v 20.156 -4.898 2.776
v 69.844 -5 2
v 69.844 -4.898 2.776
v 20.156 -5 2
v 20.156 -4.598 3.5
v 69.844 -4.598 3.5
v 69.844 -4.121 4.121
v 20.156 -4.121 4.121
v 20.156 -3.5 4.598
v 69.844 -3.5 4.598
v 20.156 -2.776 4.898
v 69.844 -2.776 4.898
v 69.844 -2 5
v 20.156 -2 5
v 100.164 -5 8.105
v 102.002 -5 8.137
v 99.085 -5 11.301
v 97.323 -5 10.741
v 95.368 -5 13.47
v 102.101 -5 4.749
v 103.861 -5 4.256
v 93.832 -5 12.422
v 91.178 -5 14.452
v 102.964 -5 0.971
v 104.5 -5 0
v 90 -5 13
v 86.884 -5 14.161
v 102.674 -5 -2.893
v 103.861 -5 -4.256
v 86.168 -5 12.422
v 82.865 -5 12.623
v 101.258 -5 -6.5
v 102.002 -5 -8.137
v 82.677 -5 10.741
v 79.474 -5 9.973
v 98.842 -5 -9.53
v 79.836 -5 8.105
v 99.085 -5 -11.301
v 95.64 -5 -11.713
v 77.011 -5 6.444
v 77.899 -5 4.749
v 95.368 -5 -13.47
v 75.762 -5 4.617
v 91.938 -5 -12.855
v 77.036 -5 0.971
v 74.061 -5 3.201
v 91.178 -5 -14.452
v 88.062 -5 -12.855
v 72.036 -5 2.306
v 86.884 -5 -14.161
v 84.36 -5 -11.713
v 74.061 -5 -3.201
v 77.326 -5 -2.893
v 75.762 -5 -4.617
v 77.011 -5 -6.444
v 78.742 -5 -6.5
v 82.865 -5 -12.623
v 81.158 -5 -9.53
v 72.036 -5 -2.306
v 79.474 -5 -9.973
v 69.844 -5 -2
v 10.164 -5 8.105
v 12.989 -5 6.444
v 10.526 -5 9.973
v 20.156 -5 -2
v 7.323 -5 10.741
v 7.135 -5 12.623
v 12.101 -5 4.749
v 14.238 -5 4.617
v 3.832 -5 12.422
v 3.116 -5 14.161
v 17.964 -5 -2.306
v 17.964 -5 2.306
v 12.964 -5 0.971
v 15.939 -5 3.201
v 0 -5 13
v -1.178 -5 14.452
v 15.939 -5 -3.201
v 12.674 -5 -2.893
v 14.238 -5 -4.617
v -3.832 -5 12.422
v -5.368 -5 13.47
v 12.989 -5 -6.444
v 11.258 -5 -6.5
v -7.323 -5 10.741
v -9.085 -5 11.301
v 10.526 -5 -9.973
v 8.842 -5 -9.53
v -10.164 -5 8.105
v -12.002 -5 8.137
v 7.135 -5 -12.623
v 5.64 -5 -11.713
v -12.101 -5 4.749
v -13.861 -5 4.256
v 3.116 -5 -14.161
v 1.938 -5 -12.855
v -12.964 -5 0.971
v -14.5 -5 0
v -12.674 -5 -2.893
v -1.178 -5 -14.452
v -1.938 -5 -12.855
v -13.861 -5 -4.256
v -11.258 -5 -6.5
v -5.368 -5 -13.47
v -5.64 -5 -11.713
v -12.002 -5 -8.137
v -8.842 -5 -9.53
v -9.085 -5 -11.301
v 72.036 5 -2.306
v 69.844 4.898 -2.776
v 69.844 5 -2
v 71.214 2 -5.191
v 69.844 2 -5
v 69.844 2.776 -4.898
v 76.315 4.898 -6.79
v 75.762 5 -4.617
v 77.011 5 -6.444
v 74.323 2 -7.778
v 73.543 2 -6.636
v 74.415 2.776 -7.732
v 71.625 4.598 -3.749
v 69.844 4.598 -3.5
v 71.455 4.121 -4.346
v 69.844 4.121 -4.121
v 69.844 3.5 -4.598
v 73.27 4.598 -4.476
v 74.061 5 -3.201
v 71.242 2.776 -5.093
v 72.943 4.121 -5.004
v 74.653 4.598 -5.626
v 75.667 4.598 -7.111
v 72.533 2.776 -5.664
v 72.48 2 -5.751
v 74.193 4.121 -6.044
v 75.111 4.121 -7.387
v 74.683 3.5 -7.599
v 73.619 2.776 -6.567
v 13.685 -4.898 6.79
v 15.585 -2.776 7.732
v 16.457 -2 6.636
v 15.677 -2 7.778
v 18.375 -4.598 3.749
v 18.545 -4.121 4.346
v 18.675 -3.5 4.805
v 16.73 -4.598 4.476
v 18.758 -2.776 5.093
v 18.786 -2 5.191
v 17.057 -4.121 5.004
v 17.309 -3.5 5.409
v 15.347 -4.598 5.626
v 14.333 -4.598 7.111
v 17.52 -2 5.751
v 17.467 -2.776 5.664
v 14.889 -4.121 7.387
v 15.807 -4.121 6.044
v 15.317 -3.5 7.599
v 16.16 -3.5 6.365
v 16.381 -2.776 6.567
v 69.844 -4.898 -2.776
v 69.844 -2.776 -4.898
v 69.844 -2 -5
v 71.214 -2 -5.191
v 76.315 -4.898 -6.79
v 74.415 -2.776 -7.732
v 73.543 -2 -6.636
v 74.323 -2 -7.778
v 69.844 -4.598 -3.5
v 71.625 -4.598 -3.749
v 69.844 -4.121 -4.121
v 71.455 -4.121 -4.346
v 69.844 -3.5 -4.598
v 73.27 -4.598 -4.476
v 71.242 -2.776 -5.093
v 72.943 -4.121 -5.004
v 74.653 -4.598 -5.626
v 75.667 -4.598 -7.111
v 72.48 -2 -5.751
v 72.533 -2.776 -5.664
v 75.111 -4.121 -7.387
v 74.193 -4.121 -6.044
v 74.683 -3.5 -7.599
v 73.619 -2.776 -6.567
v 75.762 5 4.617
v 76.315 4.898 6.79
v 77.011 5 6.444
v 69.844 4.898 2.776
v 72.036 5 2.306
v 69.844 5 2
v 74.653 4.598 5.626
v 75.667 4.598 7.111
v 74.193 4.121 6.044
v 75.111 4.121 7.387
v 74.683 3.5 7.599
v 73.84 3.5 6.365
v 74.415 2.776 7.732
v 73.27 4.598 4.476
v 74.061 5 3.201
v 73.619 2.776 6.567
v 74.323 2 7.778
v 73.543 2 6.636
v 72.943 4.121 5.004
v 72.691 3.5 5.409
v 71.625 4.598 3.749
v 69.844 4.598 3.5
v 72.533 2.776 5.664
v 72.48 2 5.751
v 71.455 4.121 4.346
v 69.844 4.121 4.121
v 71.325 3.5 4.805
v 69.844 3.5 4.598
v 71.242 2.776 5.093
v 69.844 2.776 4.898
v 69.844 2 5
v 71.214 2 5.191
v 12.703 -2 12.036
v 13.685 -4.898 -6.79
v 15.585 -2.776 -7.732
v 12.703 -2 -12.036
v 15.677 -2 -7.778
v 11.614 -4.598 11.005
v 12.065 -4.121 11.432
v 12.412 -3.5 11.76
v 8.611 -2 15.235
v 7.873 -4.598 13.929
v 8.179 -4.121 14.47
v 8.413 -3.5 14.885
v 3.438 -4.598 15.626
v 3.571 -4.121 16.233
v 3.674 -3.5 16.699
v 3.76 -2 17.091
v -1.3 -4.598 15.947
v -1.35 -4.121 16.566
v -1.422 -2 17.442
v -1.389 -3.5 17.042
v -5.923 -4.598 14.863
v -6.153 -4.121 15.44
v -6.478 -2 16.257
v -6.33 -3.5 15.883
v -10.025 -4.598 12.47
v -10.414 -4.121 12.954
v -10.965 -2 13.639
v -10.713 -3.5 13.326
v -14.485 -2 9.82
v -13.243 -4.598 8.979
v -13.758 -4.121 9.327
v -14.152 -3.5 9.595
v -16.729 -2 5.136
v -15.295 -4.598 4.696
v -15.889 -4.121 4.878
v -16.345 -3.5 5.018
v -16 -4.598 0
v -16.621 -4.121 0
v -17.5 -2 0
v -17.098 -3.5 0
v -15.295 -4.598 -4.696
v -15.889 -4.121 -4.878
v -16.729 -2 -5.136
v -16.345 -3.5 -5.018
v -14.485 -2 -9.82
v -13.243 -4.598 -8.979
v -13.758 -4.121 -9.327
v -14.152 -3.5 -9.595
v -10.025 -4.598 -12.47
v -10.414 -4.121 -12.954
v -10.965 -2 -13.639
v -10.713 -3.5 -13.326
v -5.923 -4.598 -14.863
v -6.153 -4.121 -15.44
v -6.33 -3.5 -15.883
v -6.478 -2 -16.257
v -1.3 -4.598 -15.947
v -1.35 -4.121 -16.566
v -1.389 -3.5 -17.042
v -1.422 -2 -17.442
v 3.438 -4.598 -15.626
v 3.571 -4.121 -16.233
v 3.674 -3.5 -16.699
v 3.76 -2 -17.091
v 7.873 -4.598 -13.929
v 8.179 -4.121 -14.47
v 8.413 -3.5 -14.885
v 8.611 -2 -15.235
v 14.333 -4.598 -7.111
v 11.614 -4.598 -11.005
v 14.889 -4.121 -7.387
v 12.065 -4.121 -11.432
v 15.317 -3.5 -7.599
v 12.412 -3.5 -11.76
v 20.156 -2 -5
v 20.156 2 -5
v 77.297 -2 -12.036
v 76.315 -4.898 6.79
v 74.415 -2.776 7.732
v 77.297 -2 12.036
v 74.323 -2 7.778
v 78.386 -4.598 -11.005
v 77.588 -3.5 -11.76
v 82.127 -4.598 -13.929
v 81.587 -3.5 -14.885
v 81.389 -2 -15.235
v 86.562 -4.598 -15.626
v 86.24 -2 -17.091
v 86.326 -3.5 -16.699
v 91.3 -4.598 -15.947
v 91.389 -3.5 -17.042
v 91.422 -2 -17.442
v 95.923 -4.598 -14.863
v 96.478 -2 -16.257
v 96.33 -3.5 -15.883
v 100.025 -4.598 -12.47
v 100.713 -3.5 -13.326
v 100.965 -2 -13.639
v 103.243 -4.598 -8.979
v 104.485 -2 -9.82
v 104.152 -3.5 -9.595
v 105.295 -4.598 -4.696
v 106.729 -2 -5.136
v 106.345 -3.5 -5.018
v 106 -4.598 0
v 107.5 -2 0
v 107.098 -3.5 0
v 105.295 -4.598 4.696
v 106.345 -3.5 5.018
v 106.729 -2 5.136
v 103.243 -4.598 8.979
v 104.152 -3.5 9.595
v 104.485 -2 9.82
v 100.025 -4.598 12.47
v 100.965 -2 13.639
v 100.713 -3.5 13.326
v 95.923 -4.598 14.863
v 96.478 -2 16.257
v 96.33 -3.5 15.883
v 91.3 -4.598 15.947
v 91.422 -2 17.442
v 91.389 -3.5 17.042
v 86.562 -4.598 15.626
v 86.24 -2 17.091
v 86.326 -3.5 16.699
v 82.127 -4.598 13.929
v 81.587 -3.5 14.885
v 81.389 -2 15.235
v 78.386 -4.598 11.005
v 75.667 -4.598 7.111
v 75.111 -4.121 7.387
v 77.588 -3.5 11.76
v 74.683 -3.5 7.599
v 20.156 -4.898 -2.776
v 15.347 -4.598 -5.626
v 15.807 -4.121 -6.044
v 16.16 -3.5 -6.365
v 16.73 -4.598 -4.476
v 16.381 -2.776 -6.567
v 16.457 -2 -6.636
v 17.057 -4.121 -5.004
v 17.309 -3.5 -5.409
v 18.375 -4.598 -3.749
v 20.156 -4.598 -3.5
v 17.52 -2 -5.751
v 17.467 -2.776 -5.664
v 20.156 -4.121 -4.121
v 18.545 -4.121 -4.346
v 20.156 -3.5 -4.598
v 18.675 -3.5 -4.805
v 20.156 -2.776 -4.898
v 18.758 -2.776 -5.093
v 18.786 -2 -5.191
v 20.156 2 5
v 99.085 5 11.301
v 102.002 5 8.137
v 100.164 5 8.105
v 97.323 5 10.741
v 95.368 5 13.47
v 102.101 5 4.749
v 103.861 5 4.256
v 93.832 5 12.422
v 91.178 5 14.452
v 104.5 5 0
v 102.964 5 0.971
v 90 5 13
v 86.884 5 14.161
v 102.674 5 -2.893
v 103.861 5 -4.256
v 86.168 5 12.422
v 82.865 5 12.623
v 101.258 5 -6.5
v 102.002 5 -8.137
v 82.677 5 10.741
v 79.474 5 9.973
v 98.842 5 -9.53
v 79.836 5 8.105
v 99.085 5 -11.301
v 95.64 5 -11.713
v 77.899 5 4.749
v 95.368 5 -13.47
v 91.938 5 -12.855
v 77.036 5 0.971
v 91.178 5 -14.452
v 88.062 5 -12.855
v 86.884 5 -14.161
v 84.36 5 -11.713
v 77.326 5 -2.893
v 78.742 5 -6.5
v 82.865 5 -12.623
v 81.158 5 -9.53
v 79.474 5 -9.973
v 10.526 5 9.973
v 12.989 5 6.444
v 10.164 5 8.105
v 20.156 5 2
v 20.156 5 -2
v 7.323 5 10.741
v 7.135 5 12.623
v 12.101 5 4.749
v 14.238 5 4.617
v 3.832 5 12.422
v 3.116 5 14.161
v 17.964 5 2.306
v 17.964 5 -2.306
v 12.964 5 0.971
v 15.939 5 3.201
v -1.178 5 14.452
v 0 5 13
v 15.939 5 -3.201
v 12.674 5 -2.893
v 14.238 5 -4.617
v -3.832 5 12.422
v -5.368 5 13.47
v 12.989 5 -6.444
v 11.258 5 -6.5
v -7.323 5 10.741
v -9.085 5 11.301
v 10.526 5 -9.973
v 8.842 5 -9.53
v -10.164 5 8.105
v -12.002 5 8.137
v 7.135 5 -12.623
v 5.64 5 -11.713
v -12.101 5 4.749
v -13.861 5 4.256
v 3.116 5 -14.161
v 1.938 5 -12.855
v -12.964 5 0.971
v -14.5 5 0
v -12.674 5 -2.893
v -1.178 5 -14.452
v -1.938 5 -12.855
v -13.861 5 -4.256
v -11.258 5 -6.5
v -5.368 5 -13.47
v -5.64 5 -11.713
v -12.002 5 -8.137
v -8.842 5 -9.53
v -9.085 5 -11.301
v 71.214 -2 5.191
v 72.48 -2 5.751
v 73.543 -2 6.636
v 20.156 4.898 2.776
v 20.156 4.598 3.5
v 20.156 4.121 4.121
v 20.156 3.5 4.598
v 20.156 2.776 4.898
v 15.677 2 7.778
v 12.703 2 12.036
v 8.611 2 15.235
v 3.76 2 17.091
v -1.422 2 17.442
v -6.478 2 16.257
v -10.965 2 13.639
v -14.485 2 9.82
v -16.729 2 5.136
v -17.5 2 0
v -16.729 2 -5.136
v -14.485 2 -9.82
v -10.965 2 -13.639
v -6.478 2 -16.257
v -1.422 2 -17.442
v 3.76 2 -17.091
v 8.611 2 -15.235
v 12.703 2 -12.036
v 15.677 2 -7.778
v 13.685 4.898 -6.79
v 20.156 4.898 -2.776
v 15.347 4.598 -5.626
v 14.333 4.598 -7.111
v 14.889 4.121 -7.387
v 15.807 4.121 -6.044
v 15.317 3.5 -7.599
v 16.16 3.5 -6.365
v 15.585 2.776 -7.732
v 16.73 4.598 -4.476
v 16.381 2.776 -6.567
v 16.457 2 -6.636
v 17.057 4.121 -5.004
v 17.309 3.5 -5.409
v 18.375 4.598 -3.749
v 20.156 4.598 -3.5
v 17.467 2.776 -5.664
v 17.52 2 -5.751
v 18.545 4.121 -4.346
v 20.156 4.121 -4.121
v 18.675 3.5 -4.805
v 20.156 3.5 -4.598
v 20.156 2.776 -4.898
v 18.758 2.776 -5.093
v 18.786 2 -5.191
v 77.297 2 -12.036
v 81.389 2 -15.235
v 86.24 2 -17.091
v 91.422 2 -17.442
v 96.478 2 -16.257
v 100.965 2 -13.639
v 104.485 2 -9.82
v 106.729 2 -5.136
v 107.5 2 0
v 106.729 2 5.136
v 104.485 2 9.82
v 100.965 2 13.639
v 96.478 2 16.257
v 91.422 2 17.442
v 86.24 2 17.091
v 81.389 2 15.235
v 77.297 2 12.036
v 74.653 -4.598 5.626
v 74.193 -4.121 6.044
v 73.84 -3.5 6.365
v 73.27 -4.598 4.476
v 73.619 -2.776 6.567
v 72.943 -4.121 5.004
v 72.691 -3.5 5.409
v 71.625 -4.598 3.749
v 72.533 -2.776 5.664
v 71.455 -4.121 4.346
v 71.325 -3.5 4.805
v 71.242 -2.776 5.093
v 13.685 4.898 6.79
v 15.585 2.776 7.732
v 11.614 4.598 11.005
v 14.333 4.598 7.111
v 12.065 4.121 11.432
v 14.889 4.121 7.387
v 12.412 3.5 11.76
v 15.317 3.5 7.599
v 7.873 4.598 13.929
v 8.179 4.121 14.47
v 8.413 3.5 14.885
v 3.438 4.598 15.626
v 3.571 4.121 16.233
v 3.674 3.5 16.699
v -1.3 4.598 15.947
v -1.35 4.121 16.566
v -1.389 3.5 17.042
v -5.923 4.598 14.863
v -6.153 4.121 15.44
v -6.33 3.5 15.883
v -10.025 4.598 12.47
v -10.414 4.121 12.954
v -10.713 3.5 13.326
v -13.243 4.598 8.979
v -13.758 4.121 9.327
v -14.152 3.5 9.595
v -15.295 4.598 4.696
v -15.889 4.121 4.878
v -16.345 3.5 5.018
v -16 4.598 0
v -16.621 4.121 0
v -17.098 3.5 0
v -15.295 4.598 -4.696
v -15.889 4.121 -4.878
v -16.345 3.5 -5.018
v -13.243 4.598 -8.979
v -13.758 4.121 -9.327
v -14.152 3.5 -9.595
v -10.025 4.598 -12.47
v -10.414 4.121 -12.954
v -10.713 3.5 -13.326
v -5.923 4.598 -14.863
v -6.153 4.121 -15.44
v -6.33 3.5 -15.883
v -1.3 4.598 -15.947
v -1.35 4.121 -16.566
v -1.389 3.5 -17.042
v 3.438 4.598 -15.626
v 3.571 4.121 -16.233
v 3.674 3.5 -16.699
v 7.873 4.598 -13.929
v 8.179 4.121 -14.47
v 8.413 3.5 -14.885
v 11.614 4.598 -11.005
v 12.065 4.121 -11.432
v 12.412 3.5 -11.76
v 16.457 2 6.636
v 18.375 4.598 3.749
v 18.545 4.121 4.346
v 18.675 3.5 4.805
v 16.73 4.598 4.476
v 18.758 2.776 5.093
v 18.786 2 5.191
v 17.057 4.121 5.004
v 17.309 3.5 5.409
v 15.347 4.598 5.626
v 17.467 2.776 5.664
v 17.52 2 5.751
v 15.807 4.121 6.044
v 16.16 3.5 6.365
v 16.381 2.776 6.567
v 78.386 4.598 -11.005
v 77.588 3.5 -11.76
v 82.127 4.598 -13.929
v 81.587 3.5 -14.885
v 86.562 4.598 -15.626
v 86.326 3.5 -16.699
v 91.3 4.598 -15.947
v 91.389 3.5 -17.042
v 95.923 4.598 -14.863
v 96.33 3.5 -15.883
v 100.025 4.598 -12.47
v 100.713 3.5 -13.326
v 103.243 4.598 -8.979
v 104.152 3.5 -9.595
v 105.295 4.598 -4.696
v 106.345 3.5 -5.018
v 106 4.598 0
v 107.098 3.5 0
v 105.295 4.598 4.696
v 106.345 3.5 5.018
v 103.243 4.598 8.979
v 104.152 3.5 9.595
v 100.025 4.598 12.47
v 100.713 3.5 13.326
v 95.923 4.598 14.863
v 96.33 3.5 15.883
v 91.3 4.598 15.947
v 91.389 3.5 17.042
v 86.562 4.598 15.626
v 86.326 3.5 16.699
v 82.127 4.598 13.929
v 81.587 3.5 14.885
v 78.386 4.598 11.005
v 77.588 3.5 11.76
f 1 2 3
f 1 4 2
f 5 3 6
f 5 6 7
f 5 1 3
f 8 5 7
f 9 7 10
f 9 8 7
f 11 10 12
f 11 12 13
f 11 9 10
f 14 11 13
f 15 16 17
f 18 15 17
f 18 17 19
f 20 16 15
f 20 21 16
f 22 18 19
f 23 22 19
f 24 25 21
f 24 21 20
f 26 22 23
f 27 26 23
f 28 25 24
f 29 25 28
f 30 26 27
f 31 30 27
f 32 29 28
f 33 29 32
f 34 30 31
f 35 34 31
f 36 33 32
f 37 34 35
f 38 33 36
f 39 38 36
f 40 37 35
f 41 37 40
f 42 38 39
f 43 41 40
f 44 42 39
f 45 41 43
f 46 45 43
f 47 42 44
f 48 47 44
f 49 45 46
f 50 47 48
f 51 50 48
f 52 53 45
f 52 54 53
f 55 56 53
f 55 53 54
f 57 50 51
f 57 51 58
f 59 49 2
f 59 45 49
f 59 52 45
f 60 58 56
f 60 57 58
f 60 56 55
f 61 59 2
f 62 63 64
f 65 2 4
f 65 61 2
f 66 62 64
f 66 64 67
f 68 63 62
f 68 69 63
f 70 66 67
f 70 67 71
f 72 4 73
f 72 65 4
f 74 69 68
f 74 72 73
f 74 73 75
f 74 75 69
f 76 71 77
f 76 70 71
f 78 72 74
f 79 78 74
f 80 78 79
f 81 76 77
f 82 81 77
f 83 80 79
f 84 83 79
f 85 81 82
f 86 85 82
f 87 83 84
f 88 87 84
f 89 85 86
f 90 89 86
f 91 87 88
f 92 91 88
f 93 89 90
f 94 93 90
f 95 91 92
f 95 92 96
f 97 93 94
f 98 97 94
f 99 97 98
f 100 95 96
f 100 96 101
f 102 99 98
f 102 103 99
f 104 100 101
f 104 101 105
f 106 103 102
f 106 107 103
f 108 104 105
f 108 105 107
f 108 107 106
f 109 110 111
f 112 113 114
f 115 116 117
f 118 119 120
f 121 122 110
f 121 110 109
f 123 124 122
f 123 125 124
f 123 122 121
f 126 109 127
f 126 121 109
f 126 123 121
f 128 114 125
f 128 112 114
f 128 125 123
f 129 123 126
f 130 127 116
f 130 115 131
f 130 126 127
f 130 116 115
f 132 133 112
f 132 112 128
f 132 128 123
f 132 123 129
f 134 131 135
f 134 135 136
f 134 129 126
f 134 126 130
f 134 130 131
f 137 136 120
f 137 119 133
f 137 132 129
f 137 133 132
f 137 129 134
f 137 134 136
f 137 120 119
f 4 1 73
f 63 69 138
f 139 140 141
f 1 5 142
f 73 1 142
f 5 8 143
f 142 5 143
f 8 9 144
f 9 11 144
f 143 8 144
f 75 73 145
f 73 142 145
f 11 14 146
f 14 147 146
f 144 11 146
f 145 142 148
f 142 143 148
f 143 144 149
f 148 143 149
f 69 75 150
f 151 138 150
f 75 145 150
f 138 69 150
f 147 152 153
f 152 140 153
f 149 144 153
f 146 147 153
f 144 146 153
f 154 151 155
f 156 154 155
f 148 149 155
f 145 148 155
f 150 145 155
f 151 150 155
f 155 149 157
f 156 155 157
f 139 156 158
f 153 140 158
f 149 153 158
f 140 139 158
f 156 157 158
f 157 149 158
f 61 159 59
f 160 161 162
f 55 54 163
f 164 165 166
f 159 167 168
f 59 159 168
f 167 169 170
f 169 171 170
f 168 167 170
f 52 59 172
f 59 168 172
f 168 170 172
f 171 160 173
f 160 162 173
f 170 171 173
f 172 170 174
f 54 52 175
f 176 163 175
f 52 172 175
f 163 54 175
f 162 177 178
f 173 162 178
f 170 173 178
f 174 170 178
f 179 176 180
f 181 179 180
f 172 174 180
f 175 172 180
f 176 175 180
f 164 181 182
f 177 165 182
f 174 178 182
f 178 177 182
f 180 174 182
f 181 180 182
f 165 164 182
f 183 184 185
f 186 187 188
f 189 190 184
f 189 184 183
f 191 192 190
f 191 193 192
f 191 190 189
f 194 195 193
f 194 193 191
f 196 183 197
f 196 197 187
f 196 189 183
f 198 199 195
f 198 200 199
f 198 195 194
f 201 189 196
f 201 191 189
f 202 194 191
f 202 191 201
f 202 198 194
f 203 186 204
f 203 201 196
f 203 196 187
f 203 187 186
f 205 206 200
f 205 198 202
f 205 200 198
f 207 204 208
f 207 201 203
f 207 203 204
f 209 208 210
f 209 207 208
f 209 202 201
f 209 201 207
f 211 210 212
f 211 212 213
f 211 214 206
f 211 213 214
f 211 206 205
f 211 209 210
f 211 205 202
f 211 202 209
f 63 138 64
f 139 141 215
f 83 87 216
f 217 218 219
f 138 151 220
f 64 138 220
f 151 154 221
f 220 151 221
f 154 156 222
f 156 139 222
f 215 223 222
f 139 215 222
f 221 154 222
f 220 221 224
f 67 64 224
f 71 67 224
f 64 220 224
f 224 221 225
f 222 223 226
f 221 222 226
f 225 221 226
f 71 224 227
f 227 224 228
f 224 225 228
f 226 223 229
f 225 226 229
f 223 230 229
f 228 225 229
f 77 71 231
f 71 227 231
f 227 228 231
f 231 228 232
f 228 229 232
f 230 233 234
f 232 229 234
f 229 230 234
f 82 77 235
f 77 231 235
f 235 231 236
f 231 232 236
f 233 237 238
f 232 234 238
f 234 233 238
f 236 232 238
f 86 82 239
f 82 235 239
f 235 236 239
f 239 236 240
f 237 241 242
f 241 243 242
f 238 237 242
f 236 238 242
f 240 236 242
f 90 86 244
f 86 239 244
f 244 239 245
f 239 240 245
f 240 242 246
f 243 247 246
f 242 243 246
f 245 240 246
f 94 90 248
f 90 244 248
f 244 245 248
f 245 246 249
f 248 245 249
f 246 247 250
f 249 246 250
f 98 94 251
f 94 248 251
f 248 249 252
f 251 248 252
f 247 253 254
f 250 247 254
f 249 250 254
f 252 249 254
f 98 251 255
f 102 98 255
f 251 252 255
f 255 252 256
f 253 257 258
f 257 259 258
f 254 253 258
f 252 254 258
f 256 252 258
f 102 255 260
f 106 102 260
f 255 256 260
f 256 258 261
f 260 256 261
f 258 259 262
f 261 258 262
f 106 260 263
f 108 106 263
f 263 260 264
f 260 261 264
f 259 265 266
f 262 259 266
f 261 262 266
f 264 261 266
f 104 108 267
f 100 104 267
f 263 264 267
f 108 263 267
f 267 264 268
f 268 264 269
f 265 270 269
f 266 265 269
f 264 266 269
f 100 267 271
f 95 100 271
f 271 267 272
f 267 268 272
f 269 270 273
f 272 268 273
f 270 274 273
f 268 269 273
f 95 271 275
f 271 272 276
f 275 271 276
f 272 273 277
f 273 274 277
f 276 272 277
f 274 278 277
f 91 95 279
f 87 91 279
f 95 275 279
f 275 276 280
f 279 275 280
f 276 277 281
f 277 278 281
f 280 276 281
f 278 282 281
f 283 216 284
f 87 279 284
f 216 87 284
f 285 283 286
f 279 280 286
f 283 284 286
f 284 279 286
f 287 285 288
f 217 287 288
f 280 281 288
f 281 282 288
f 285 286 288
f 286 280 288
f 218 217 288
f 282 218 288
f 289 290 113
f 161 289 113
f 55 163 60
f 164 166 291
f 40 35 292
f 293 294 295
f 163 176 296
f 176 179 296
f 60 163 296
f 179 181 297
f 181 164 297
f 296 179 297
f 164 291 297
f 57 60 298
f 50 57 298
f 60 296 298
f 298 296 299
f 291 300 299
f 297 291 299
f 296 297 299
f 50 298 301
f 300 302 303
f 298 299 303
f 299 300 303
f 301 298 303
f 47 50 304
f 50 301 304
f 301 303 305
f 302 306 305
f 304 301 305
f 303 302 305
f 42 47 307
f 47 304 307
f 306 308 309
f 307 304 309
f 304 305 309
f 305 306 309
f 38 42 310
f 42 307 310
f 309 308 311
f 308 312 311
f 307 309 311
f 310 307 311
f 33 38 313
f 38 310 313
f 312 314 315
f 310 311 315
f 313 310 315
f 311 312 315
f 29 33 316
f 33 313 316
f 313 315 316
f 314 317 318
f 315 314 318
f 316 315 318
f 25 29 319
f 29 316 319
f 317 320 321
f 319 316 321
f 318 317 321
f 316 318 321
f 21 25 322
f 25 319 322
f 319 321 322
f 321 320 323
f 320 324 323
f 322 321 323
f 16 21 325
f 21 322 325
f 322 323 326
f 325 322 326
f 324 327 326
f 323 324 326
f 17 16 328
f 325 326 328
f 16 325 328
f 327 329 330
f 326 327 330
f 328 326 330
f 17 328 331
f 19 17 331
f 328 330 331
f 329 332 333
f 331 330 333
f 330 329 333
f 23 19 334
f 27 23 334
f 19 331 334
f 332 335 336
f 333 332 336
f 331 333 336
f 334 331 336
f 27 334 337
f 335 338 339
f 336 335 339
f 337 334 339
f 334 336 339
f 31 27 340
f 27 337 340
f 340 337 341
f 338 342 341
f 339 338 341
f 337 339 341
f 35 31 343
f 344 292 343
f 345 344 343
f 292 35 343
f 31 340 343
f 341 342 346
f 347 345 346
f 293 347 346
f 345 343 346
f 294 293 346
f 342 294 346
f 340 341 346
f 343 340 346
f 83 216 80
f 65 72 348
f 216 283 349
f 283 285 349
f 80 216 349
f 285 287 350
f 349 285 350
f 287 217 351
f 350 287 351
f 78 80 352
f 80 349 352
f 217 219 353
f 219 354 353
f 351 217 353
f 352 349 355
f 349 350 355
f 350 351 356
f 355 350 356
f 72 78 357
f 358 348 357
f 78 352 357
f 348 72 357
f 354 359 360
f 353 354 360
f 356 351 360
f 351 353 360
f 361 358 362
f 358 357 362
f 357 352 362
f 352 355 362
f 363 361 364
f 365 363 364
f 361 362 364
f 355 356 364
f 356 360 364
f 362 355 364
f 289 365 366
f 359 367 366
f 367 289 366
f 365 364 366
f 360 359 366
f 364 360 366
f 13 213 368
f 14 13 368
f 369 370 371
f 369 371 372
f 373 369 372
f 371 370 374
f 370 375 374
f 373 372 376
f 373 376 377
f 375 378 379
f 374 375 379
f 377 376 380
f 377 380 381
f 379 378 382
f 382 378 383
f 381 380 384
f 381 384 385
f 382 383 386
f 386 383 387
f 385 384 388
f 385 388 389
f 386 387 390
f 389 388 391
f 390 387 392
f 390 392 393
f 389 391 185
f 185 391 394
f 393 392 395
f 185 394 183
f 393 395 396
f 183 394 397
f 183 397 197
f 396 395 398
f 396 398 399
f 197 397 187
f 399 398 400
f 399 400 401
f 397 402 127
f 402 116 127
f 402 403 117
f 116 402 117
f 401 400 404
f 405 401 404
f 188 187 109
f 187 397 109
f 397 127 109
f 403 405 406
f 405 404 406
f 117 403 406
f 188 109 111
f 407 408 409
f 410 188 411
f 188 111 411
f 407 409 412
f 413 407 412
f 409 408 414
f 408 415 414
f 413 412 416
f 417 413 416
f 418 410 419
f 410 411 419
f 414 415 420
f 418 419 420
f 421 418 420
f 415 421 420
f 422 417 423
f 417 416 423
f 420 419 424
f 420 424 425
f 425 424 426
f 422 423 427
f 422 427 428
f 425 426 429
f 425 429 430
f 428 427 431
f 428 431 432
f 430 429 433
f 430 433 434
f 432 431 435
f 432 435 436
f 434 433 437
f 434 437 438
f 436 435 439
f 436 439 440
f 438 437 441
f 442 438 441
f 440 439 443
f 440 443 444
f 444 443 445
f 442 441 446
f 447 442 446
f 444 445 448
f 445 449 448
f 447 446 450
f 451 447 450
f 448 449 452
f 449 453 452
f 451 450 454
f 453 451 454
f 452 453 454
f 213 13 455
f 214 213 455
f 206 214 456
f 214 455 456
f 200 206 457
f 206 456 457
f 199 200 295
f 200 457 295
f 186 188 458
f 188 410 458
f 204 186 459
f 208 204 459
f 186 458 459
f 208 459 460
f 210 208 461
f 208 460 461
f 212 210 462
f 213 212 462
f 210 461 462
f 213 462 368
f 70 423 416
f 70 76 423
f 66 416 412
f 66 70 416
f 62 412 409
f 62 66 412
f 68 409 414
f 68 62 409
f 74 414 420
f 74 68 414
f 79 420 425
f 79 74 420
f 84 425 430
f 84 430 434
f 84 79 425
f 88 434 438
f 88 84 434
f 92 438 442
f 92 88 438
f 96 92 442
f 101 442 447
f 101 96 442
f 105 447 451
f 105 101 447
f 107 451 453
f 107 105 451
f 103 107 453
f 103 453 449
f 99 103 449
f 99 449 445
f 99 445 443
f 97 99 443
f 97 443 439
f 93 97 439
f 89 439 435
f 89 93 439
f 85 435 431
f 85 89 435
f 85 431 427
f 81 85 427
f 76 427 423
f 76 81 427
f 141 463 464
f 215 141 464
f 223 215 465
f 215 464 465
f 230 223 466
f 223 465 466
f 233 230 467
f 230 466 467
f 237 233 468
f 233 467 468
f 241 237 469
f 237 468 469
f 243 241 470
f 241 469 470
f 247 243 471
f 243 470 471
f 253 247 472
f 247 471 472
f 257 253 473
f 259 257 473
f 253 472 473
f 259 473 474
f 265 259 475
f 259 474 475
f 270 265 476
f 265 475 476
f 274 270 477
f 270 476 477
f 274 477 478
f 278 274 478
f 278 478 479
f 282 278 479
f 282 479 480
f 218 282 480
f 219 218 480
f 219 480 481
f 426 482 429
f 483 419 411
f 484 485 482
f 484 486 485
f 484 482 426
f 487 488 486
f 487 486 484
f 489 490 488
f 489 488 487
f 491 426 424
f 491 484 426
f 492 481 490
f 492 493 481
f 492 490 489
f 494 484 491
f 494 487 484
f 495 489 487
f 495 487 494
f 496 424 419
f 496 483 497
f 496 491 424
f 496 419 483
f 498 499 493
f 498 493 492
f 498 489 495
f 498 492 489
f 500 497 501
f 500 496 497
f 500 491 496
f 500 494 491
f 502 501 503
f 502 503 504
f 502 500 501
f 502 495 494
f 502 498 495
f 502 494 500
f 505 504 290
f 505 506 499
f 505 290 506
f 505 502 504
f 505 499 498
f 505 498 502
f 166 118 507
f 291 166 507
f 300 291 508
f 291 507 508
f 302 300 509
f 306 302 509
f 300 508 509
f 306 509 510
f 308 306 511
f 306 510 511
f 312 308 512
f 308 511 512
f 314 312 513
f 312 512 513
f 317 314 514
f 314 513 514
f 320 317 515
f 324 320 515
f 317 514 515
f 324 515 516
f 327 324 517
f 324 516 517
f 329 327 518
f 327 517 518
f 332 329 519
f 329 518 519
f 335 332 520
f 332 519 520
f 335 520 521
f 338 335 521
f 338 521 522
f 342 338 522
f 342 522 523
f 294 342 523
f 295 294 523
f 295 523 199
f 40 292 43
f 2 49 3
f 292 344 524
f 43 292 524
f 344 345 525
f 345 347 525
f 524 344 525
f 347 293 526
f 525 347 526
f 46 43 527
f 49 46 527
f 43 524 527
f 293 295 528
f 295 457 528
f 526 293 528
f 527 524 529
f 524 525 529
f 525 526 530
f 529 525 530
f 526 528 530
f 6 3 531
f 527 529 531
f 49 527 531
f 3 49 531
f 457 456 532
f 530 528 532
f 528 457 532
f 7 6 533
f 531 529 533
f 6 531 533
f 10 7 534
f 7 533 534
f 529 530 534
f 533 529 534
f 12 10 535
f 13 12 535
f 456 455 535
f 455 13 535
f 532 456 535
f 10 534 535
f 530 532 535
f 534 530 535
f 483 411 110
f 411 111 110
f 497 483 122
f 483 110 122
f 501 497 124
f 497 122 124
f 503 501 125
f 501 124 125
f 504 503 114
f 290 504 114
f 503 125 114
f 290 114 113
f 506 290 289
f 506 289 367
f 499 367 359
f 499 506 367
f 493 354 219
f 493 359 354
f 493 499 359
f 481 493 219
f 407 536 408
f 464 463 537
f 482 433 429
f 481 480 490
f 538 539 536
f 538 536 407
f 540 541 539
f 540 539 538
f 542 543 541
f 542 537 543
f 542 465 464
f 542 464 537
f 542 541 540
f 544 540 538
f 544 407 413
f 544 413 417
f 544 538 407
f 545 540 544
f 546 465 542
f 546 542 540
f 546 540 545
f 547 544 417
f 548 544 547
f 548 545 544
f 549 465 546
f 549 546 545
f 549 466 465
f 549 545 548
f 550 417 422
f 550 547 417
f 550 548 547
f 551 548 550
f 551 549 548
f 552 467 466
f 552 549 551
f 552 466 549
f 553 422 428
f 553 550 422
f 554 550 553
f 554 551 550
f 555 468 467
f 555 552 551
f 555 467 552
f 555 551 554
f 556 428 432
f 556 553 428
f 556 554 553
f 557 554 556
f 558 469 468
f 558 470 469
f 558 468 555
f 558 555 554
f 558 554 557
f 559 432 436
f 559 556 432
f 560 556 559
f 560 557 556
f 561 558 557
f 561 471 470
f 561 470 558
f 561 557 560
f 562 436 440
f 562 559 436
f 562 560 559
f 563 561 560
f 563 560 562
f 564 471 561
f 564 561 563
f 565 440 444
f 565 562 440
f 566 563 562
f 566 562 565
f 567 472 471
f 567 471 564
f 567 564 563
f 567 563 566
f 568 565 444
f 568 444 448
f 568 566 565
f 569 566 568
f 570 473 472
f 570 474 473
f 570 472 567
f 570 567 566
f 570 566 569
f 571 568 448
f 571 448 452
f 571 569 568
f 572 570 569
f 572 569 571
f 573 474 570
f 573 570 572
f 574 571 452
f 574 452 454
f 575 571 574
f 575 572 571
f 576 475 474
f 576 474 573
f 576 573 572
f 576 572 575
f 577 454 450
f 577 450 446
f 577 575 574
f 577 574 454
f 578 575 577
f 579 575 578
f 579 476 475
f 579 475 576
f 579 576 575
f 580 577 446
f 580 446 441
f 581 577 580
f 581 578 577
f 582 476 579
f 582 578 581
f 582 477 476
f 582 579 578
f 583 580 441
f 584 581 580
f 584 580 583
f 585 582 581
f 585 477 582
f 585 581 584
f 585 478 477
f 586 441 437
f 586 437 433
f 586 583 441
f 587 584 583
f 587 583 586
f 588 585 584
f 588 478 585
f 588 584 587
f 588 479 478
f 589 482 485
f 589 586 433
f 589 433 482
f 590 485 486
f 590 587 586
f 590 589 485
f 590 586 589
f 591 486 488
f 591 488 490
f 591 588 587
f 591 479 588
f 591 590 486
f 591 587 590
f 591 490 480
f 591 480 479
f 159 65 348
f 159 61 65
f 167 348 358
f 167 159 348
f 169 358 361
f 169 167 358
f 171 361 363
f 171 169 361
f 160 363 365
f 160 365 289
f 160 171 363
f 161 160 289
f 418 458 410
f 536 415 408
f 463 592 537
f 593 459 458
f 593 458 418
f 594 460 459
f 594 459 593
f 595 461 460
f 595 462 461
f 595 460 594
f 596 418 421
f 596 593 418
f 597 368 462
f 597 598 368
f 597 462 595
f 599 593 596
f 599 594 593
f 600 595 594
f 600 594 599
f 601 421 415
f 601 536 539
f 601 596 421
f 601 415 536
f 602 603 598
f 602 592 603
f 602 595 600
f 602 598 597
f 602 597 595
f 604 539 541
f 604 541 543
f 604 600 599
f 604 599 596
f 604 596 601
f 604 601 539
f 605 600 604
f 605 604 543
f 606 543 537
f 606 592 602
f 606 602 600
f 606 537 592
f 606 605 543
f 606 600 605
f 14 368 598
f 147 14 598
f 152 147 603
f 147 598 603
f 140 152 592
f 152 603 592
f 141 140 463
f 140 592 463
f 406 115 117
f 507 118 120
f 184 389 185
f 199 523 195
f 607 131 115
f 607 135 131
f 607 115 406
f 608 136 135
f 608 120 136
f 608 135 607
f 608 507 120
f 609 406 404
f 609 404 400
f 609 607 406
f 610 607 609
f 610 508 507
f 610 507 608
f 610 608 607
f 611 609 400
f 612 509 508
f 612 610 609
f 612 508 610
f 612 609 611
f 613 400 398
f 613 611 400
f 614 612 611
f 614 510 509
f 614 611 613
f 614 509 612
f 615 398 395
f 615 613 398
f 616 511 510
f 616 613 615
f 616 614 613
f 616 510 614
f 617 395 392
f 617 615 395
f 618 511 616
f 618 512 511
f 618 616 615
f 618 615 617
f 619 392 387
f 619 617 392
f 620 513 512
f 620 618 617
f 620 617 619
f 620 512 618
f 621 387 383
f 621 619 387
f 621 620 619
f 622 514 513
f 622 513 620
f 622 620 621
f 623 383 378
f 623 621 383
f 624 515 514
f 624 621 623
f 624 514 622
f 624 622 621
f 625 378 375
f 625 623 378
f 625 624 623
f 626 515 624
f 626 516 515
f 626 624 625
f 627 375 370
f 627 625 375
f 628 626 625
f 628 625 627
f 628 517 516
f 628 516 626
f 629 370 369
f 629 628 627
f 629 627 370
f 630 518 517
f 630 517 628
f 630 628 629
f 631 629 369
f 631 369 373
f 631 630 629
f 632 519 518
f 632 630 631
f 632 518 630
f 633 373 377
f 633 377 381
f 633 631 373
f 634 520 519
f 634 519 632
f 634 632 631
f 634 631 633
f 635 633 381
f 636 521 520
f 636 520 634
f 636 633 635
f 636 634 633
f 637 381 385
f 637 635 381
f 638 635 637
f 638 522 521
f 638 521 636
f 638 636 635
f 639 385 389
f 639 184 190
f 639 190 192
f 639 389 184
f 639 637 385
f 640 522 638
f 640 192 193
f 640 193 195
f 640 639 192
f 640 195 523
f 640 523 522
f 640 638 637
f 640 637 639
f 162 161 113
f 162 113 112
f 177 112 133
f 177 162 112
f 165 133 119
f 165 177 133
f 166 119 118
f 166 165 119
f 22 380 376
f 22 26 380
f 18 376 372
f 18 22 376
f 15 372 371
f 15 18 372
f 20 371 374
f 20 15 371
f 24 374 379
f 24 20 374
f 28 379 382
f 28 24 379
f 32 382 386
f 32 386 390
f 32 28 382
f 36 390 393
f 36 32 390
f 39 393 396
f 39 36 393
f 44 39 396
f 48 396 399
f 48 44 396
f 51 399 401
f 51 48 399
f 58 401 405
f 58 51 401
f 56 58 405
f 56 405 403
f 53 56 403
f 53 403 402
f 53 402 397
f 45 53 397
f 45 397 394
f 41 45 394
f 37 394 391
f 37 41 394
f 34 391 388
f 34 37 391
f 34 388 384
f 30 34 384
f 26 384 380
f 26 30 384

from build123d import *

# Parameters (mm, degrees)
SKETCH1_R           = 13
BOSS_EXTRUDE1_DEPTH = 5
FILLET1_R           = 5
FILLET2_R           = 3


with BuildPart() as part:
    # Sketch1 → Boss-Extrude1 (new, symmetric)
    with BuildSketch(Plane(origin=(0, 0, 0), x_dir=(1, 0, 0), z_dir=(0, 1, 0))):
        with BuildLine():
            Line((16.770509831, 5), (73.229490169, 5))
            ThreePointArc((73.229490169, 5), (107.5, 0), (73.229490169, -5))
            Line((73.229490169, -5), (16.770509831, -5))
            ThreePointArc((16.770509831, -5), (-17.5, 0), (16.770509831, 5))
        make_face()
        with Locations(Location((0, 0, 0), (0, 0, 270))):
            Circle(SKETCH1_R, mode=Mode.SUBTRACT)
        with Locations(Location((90, 0, 0), (0, 0, 270))):
            Circle(SKETCH1_R, mode=Mode.SUBTRACT)
    extrude(amount=BOSS_EXTRUDE1_DEPTH, both=True)

    # Fillet1
    fillet1_edges = [part.edges().sort_by_distance(p)[0] for p in [
        (16.770509831, 0, -5),
        (73.229490169, 0, -5),
        (73.229490169, 0, 5),
        (16.770509831, 0, 5),
    ]]
    fillet(fillet1_edges, radius=FILLET1_R)

    # Fillet2
    fillet2_edges = [part.edges().sort_by_distance(p)[0] for p in [
        (107.5, -5, 0),
        (107.5, 5, 0),
        (45, -5, 5),
        (45, 5, 5),
        (45, -5, -5),
        (45, 5, -5),
        (-17.5, -5, 0),
        (-17.5, 5, 0),
        (72.479587013, -5, 5.750817072),
        (72.479587013, 5, 5.750817072),
        (72.479587013, -5, -5.750817072),
        (72.479587013, 5, -5.750817072),
        (17.520412987, -5, -5.750817072),
        (17.520412987, 5, -5.750817072),
        (17.520412987, -5, 5.750817072),
        (17.520412987, 5, 5.750817072),
    ]]
    fillet(fillet2_edges, radius=FILLET2_R)


solid = part.part
